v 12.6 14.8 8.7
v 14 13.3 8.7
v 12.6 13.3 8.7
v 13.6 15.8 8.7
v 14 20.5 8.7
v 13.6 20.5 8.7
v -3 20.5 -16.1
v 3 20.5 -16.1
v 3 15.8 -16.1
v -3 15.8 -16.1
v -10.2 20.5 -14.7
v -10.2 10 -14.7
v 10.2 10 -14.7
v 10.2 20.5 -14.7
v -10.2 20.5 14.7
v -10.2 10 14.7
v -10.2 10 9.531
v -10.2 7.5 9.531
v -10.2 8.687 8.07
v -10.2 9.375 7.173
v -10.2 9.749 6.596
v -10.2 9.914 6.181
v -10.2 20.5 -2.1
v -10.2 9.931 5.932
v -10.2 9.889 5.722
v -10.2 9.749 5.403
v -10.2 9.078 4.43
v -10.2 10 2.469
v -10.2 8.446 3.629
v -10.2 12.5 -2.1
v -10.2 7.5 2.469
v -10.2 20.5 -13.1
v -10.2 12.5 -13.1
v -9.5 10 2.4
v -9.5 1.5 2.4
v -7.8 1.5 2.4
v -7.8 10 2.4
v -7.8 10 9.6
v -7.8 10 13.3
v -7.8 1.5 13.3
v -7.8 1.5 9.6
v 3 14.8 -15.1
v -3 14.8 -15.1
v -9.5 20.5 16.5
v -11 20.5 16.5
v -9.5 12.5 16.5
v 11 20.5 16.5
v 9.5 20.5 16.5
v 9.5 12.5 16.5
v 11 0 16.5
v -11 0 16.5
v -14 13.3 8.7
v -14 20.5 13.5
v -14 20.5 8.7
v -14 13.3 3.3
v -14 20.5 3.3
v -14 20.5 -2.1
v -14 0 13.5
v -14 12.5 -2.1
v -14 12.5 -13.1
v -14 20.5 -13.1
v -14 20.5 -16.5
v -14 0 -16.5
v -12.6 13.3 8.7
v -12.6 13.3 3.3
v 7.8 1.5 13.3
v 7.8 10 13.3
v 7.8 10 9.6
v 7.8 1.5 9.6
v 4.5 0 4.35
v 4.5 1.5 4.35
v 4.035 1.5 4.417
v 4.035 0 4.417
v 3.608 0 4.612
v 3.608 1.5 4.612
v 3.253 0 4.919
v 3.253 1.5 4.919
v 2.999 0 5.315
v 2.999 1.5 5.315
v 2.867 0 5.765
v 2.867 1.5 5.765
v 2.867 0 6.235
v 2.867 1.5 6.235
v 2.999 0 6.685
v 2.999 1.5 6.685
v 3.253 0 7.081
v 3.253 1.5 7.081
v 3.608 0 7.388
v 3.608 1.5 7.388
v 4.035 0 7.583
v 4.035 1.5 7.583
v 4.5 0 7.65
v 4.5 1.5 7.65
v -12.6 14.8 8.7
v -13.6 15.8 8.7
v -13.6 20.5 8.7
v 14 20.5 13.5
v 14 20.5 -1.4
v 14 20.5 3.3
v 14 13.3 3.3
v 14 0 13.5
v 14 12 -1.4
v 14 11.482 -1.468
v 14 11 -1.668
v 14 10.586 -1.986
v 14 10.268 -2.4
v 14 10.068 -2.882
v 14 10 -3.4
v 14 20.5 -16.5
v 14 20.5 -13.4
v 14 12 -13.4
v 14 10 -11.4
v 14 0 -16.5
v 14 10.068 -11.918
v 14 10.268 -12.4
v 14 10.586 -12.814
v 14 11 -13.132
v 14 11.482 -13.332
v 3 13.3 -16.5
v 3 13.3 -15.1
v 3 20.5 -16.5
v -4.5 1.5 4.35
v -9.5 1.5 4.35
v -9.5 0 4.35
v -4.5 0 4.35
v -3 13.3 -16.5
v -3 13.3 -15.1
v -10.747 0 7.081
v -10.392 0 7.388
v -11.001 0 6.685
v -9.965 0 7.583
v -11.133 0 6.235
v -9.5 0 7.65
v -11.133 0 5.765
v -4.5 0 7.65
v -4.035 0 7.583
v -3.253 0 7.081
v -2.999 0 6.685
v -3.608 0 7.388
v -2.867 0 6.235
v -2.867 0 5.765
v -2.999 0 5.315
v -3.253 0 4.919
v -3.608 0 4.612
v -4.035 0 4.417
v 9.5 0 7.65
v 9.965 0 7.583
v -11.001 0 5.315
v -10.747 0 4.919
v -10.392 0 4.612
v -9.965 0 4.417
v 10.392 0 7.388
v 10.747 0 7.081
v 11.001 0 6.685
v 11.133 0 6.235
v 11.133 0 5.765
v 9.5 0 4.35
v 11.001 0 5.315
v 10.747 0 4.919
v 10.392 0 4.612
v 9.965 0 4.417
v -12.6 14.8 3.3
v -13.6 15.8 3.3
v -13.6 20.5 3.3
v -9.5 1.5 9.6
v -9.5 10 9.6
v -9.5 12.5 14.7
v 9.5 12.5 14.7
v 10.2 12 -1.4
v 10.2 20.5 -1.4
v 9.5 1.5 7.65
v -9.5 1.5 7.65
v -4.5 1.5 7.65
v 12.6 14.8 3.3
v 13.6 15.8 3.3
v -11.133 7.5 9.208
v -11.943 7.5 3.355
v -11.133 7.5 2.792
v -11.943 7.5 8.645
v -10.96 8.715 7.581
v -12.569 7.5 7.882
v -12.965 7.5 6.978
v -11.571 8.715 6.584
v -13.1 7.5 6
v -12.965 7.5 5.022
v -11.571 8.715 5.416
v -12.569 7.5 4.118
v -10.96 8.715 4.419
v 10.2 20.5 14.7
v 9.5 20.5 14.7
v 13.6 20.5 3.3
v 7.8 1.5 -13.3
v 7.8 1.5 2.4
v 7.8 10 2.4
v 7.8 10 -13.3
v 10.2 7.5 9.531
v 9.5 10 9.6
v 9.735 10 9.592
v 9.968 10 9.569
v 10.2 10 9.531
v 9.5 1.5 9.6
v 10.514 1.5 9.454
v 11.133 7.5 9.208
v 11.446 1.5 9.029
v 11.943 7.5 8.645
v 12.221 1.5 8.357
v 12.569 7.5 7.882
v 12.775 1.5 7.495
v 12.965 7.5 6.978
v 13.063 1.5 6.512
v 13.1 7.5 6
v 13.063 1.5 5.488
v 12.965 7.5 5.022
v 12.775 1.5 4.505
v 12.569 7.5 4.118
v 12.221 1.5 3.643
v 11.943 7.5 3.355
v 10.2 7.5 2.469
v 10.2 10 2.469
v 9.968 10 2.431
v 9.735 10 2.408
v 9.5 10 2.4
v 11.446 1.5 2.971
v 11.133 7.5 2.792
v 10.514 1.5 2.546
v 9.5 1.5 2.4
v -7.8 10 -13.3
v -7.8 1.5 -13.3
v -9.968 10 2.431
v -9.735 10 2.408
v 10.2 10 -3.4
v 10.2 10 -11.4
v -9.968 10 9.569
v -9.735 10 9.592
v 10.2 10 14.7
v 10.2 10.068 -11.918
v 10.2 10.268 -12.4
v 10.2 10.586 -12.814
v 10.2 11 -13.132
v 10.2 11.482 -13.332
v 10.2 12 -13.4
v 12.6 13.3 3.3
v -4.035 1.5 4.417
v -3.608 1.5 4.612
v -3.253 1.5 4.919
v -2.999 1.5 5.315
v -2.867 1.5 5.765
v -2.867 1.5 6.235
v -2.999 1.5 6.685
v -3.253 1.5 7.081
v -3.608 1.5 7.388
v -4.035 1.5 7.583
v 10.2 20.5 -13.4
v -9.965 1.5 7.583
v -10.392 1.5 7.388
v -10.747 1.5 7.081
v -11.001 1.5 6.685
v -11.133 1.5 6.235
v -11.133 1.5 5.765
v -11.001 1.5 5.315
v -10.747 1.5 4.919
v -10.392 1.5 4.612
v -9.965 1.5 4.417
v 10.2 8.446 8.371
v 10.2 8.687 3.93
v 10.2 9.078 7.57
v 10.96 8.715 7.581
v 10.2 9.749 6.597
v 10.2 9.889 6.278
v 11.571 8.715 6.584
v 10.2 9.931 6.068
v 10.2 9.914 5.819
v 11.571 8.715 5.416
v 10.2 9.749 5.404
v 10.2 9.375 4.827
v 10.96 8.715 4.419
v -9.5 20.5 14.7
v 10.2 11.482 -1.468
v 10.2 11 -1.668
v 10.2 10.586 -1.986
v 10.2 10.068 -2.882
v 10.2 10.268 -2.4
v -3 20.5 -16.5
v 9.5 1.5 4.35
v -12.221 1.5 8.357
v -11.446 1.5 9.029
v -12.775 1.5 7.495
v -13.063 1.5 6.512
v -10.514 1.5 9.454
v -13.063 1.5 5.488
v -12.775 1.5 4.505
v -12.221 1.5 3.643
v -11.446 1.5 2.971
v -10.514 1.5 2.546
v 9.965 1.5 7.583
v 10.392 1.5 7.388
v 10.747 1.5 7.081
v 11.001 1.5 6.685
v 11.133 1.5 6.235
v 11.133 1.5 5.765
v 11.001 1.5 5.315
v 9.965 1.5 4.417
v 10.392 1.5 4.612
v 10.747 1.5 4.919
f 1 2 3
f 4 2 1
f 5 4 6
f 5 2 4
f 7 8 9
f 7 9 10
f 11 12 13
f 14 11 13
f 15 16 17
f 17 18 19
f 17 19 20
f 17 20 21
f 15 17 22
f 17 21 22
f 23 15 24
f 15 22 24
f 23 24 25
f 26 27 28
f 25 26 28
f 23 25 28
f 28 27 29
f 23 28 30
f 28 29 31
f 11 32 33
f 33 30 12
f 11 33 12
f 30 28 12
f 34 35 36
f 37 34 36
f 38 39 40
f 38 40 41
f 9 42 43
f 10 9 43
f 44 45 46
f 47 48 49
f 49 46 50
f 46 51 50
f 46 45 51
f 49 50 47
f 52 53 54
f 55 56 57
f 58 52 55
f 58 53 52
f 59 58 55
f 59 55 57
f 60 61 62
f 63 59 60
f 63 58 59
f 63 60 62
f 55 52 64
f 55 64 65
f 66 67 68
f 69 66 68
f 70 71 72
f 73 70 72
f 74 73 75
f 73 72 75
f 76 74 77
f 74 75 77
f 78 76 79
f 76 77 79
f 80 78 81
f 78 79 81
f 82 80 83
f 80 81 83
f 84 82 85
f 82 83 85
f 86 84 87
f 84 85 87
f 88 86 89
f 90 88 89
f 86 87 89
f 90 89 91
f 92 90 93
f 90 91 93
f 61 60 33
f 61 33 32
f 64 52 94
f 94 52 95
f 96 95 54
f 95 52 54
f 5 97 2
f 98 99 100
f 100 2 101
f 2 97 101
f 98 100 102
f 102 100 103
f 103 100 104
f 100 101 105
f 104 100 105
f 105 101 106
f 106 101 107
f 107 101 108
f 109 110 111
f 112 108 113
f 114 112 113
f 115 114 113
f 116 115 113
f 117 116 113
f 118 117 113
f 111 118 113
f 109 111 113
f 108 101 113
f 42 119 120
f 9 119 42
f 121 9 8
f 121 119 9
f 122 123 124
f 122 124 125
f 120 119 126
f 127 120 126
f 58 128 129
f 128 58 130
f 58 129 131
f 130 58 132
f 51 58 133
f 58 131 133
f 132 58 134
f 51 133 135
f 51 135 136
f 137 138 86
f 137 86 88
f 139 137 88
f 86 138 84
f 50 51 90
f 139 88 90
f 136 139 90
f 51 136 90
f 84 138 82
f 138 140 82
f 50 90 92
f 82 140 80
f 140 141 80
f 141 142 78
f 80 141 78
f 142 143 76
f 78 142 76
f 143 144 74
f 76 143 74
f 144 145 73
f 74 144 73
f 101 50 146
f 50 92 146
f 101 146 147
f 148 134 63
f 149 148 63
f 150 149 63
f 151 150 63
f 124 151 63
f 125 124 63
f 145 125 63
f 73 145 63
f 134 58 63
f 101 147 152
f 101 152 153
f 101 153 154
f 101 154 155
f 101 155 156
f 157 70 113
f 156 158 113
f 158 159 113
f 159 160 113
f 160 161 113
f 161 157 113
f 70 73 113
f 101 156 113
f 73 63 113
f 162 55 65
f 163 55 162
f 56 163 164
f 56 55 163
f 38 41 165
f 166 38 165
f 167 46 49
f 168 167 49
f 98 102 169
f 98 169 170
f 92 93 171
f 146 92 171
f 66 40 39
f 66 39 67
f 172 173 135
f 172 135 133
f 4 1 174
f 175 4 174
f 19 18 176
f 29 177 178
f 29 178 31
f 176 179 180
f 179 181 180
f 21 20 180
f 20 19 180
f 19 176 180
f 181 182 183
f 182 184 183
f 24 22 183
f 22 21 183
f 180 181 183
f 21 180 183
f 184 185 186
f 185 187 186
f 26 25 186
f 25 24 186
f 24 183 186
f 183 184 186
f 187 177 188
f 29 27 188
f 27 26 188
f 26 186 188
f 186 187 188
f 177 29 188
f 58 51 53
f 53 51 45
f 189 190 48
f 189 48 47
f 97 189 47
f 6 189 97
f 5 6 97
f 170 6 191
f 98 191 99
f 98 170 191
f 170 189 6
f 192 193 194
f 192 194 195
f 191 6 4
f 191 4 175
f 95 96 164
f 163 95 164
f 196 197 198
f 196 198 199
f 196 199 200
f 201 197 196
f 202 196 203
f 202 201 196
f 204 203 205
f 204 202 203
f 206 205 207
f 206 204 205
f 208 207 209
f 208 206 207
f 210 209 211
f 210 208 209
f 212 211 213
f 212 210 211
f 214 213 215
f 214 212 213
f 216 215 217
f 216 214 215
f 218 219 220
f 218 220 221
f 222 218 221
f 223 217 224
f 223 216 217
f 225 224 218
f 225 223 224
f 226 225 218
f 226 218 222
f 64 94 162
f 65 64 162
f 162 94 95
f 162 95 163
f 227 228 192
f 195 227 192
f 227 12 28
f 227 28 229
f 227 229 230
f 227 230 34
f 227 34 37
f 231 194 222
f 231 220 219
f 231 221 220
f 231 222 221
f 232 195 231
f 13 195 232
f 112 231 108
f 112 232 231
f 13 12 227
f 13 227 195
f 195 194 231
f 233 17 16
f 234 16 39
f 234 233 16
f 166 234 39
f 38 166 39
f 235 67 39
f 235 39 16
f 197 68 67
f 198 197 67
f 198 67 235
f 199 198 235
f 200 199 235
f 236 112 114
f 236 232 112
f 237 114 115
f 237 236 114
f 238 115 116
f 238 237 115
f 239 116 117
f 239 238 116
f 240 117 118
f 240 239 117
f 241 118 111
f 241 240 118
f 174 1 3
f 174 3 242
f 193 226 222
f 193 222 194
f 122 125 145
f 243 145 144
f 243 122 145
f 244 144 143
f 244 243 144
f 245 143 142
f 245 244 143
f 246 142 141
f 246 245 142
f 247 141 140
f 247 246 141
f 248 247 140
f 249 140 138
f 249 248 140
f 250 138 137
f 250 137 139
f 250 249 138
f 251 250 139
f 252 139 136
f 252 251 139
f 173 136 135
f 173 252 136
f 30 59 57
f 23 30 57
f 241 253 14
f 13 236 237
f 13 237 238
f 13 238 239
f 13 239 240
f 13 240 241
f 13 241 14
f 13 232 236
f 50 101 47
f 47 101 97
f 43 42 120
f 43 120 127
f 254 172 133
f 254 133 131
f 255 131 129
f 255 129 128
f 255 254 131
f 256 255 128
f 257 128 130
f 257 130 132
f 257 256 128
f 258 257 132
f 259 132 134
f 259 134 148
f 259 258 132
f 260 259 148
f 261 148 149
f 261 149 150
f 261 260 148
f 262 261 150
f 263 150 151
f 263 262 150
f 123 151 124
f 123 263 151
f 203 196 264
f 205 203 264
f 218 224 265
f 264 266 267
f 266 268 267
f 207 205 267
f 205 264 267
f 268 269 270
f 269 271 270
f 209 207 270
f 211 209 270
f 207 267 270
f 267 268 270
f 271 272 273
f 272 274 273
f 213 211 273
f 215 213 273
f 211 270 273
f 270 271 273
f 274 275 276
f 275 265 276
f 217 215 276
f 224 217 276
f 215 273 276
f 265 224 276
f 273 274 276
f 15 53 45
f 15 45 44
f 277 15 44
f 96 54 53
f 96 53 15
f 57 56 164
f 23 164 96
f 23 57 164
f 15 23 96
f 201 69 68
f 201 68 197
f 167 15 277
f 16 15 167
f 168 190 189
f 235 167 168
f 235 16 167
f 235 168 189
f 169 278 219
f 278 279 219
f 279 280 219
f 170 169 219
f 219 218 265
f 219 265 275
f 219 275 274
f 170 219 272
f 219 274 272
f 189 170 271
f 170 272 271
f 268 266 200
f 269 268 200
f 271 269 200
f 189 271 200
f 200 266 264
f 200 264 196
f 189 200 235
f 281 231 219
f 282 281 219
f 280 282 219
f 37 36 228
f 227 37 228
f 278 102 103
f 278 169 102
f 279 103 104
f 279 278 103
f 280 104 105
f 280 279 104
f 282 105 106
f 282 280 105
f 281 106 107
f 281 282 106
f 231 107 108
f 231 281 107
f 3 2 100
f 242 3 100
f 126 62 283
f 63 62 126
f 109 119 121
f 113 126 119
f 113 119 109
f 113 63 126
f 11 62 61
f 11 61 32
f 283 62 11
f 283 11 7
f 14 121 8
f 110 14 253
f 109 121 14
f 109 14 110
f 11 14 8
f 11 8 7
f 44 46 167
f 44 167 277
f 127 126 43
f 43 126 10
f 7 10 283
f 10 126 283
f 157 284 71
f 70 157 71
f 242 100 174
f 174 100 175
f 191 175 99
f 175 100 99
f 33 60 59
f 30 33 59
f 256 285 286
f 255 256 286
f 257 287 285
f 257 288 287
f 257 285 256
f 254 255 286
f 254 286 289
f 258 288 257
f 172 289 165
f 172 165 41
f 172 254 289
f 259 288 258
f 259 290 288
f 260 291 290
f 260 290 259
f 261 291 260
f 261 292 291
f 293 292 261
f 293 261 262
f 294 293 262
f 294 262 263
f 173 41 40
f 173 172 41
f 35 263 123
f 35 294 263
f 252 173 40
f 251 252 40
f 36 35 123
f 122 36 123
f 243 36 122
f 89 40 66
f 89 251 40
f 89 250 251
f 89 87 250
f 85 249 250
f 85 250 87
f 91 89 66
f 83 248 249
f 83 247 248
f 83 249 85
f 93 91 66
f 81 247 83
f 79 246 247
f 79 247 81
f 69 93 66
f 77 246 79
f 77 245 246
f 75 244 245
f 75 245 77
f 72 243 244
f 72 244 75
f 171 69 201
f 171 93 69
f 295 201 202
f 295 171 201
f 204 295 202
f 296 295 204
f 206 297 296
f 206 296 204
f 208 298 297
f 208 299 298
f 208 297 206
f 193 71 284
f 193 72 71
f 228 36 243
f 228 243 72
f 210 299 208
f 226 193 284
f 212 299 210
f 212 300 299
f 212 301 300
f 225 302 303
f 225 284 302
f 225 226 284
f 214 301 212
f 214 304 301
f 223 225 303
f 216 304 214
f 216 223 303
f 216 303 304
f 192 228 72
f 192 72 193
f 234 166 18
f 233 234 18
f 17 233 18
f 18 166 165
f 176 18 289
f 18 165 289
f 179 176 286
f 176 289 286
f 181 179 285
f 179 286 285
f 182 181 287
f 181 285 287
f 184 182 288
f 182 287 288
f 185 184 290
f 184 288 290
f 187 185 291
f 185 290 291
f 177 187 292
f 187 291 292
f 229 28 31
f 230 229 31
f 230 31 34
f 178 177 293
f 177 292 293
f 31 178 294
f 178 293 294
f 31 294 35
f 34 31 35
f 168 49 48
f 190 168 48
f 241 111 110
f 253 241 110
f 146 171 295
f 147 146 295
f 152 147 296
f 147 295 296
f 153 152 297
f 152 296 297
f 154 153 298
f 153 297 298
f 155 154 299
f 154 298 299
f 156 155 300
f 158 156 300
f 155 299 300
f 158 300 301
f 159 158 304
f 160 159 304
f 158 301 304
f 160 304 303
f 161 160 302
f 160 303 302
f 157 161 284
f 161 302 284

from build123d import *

# Parameters (mm, degrees)
SZKIC1_W                    = 28
SZKIC1_H                    = 33
DODANIE_WYCI_GNI_CIE1_DEPTH = 1.5
SZKIC2_W                    = 28
SZKIC2_H                    = 33
SZKIC2_W_2                  = 20.4
SZKIC2_H_2                  = 29.4
DODANIE_WYCI_GNI_CIE2_DEPTH = 19
SZKIC7_W                    = 20.4
SZKIC7_H                    = 29.4
SZKIC7_W_2                  = 15.6
SZKIC7_H_2                  = 26.6
DODANIE_WYCI_GNI_CIE4_DEPTH = 8.5
SZKIC3_W                    = 12
SZKIC3_H                    = 10.5
WYTNIJ_WYCI_GNI_CIE1_DEPTH  = 3.8
SZKIC4_W                    = 19
SZKIC4_H                    = 8
WYTNIJ_WYCI_GNI_CIE2_DEPTH  = 1.8
SZKIC5_W                    = 11
SZKIC5_H                    = 8
WYTNIJ_WYCI_GNI_CIE3_DEPTH  = 3.8
WYTNIJ_WYCI_GNI_CIE4_START  = -10
WYTNIJ_WYCI_GNI_CIE4_DEPTH  = 10
WYTNIJ_WYCI_GNI_CIE8_START  = -1.5
WYTNIJ_WYCI_GNI_CIE8_DEPTH  = 8.5
ZAOKR_GLENIE1_R             = 2
SZKIC10_W                   = 5.4
SZKIC10_H                   = 7.2
WYTNIJ_WYCI_GNI_CIE9_DEPTH  = 0.4
SZKIC11_W                   = 5.4
SZKIC11_H                   = 2.5
WYTNIJ_WYCI_GNI_CIE10_DEPTH = 1
SZKIC12_W                   = 6
SZKIC12_H                   = 7.2
WYTNIJ_WYCI_GNI_CIE11_DEPTH = 0.4
SZKIC13_W                   = 6
SZKIC13_H                   = 2.5
WYTNIJ_WYCI_GNI_CIE12_DEPTH = 1
SFAZOWANIE1_SIZE            = 1
SFAZOWANIE2_SIZE            = 3
SFAZOWANIE3_SIZE            = 2.5
SFAZOWANIE3_SIZE_2          = 2.979383981


# Some blends are built 0.0001 mm under size
with BuildPart() as part:
    # Szkic1 → Dodanie-wyciągnięcie1 (new body)
    with BuildSketch(Plane(origin=(0, 0, 0), x_dir=(1, 0, 0), z_dir=(0, 1, 0))):
        Rectangle(SZKIC1_W, SZKIC1_H)
    extrude(amount=DODANIE_WYCI_GNI_CIE1_DEPTH)

    # Szkic2 → Dodanie-wyciągnięcie2 (add)
    with BuildSketch(Plane(origin=(0, 1.5, 0), x_dir=(1, 0, 0), z_dir=(0, 1, 0))):
        Rectangle(SZKIC2_W, SZKIC2_H)
        Rectangle(SZKIC2_W_2, SZKIC2_H_2, mode=Mode.SUBTRACT)
    extrude(amount=DODANIE_WYCI_GNI_CIE2_DEPTH)

    # Szkic7 → Dodanie-wyciągnięcie4 (add)
    with BuildSketch(Plane(origin=(0, 1.5, 0), x_dir=(1, 0, 0), z_dir=(0, 1, 0))):
        Rectangle(SZKIC7_W, SZKIC7_H)
        Rectangle(SZKIC7_W_2, SZKIC7_H_2, mode=Mode.SUBTRACT)
    extrude(amount=DODANIE_WYCI_GNI_CIE4_DEPTH)

    # Szkic3 → Wytnij-wyciągnięcie1 (cut)
    with BuildSketch(Plane(origin=(14, 0, 0), x_dir=(0, 0, -1), z_dir=(1, 0, 0))):
        with Locations((7.4, 15.25)):
            Rectangle(SZKIC3_W, SZKIC3_H)
    extrude(amount=-WYTNIJ_WYCI_GNI_CIE1_DEPTH, mode=Mode.SUBTRACT)

    # Szkic4 → Wytnij-wyciągnięcie2 (cut)
    with BuildSketch(Plane.XY.offset(16.5)):
        with Locations((0, 16.5)):
            Rectangle(SZKIC4_W, SZKIC4_H)
    extrude(amount=-WYTNIJ_WYCI_GNI_CIE2_DEPTH, mode=Mode.SUBTRACT)

    # Szkic5 → Wytnij-wyciągnięcie3 (cut)
    with BuildSketch(Plane.ZY.offset(14)):
        with Locations((-7.6, 16.5)):
            Rectangle(SZKIC5_W, SZKIC5_H)
    extrude(amount=-WYTNIJ_WYCI_GNI_CIE3_DEPTH, mode=Mode.SUBTRACT)

    # Szkic8 → Wytnij-wyciągnięcie4 (cut)
    with BuildSketch(Plane.XZ.offset(WYTNIJ_WYCI_GNI_CIE4_START)):
        with BuildLine():
            Line((9.5, 4.35), (4.5, 4.35))
            ThreePointArc((4.5, 4.35), (2.85, 6), (4.5, 7.65))
            Line((4.5, 7.65), (9.5, 7.65))
            ThreePointArc((9.5, 7.65), (11.15, 6), (9.5, 4.35))
        make_face()
        with BuildLine():
            Line((-9.5, 4.35), (-4.5, 4.35))
            ThreePointArc((-4.5, 4.35), (-2.85, 6), (-4.5, 7.65))
            Line((-4.5, 7.65), (-9.5, 7.65))
            ThreePointArc((-9.5, 7.65), (-11.15, 6), (-9.5, 4.35))
        make_face()
    extrude(amount=WYTNIJ_WYCI_GNI_CIE4_DEPTH, mode=Mode.SUBTRACT)

    # Szkic9 → Wytnij-wyciągnięcie8 (cut)
    with BuildSketch(Plane.XZ.offset(WYTNIJ_WYCI_GNI_CIE8_START)):
        with BuildLine():
            Line((-9.5, 2.4), (-5.001731613, 2.4))
            Line((-5.001731613, 2.4), (-5.001731613, 9.6))
            Line((-5.001731613, 9.6), (-9.5, 9.6))
            ThreePointArc((-9.5, 9.6), (-13.1, 6), (-9.5, 2.4))
        make_face()
        with BuildLine():
            Line((5.001731613, 9.6), (9.5, 9.6))
            ThreePointArc((9.5, 9.6), (13.1, 6), (9.5, 2.4))
            Line((9.5, 2.4), (5.001731613, 2.4))
            Line((5.001731613, 2.4), (5.001731613, 9.6))
        make_face()
    extrude(amount=-WYTNIJ_WYCI_GNI_CIE8_DEPTH, mode=Mode.SUBTRACT)

    # Zaokrąglenie1
    zaokr_glenie1_edges = [part.edges().sort_by_distance(p)[0] for p in [
        (12.1, 10, -13.4),
        (12.1, 10, -1.4),
    ]]
    fillet(zaokr_glenie1_edges, radius=ZAOKR_GLENIE1_R)

    # Szkic10 → Wytnij-wyciągnięcie9 (cut)
    with BuildSketch(Plane(origin=(14, 0, 0), x_dir=(0, 0, -1), z_dir=(1, 0, 0))):
        with Locations((-6, 16.9)):
            Rectangle(SZKIC10_W, SZKIC10_H)
    wytnij_wyci_gni_cie9 = extrude(amount=-WYTNIJ_WYCI_GNI_CIE9_DEPTH, mode=Mode.SUBTRACT)

    # Szkic11 → Wytnij-wyciągnięcie10 (cut)
    with BuildSketch(Plane(origin=(13.6, 0, 0), x_dir=(0, 0, -1), z_dir=(1, 0, 0))):
        with Locations((-6, 14.55)):
            Rectangle(SZKIC11_W, SZKIC11_H)
    wytnij_wyci_gni_cie10 = extrude(amount=-WYTNIJ_WYCI_GNI_CIE10_DEPTH, mode=Mode.SUBTRACT)

    # Szkic12 → Wytnij-wyciągnięcie11 (cut)
    with BuildSketch(Plane(origin=(0, 0, -16.5), x_dir=(-1, 0, 0), z_dir=(0, 0, -1))):
        with Locations((0, 16.9)):
            Rectangle(SZKIC12_W, SZKIC12_H)
    extrude(amount=-WYTNIJ_WYCI_GNI_CIE11_DEPTH, mode=Mode.SUBTRACT)

    # Szkic13 → Wytnij-wyciągnięcie12 (cut)
    with BuildSketch(Plane(origin=(0, 0, -16.1), x_dir=(-1, 0, 0), z_dir=(0, 0, -1))):
        with Locations((0, 14.55)):
            Rectangle(SZKIC13_W, SZKIC13_H)
    extrude(amount=-WYTNIJ_WYCI_GNI_CIE12_DEPTH, mode=Mode.SUBTRACT)

    # Lustro1: Wytnij-wyciągnięcie9, Wytnij-wyciągnięcie10 across plane
    add(wytnij_wyci_gni_cie9.mirror(Plane(origin=(0, 0, 0), x_dir=(0, 0, 1), z_dir=(1, 0, 0))), mode=Mode.SUBTRACT)
    add(wytnij_wyci_gni_cie10.mirror(Plane(origin=(0, 0, 0), x_dir=(0, 0, 1), z_dir=(1, 0, 0))), mode=Mode.SUBTRACT)

    # Sfazowanie1
    sfazowanie1_edges = [part.edges().sort_by_distance(p)[0] for p in [
        (12.6, 15.8, 6),
        (0, 15.8, -15.1),
        (-12.6, 15.8, 6),
    ]]
    chamfer(sfazowanie1_edges, length=SFAZOWANIE1_SIZE - 0.0001)  # a hair under: the kernel refuses the full size

    # Sfazowanie2
    sfazowanie2_edges = [part.edges().sort_by_distance(p)[0] for p in [
        (14, 10.25, 16.5),
        (-14, 10.25, 16.5),
    ]]
    chamfer(sfazowanie2_edges, length=SFAZOWANIE2_SIZE)

    # Sfazowanie3
    # the kernel refuses this chamfer: 2.979383981, 2.5 mm, written as the material it adds along each edge
    with BuildSketch(Plane(origin=(9.5, 10, 6), x_dir=(-0.9999950652018581, 0, 0.0031415874858795353), z_dir=(-0.0031415874858795353, 0, -0.9999950652018581))) as sfazowanie3_piece_1_section:
        Polygon((3.6, -SFAZOWANIE3_SIZE), (3.6 - SFAZOWANIE3_SIZE_2, 0), (3.6, 0), align=None)
    sfazowanie3_piece_1 = revolve(axis=Axis((9.5, 10, 6), (0, 1, 0)), revolution_arc=359.64, mode=Mode.PRIVATE)
    sfazowanie3_piece_1 = split(sfazowanie3_piece_1, bisect_by=Plane(origin=(10.2, 9.026977163, 6), z_dir=(1, 0, 0)), keep=Keep.TOP, mode=Mode.PRIVATE)
    add(sfazowanie3_piece_1)
    with BuildSketch(Plane(origin=(-9.5, 10, 6), x_dir=(0.9999950652018581, 0, 0.003141587485879782), z_dir=(0.003141587485879782, 0, -0.9999950652018581))) as sfazowanie3_piece_2_section:
        Polygon((3.6 - SFAZOWANIE3_SIZE_2, 0), (3.6, SFAZOWANIE3_SIZE), (3.6, 0), align=None)
    sfazowanie3_piece_2 = revolve(axis=Axis((-9.5, 10, 6), (0, -1, 0)), revolution_arc=359.64, mode=Mode.PRIVATE)
    sfazowanie3_piece_2 = split(sfazowanie3_piece_2, bisect_by=Plane(origin=(-10.2, 9.026977163, 6.000000001), z_dir=(-1, 0, 0)), keep=Keep.TOP, mode=Mode.PRIVATE)
    add(sfazowanie3_piece_2)


solid = part.part
